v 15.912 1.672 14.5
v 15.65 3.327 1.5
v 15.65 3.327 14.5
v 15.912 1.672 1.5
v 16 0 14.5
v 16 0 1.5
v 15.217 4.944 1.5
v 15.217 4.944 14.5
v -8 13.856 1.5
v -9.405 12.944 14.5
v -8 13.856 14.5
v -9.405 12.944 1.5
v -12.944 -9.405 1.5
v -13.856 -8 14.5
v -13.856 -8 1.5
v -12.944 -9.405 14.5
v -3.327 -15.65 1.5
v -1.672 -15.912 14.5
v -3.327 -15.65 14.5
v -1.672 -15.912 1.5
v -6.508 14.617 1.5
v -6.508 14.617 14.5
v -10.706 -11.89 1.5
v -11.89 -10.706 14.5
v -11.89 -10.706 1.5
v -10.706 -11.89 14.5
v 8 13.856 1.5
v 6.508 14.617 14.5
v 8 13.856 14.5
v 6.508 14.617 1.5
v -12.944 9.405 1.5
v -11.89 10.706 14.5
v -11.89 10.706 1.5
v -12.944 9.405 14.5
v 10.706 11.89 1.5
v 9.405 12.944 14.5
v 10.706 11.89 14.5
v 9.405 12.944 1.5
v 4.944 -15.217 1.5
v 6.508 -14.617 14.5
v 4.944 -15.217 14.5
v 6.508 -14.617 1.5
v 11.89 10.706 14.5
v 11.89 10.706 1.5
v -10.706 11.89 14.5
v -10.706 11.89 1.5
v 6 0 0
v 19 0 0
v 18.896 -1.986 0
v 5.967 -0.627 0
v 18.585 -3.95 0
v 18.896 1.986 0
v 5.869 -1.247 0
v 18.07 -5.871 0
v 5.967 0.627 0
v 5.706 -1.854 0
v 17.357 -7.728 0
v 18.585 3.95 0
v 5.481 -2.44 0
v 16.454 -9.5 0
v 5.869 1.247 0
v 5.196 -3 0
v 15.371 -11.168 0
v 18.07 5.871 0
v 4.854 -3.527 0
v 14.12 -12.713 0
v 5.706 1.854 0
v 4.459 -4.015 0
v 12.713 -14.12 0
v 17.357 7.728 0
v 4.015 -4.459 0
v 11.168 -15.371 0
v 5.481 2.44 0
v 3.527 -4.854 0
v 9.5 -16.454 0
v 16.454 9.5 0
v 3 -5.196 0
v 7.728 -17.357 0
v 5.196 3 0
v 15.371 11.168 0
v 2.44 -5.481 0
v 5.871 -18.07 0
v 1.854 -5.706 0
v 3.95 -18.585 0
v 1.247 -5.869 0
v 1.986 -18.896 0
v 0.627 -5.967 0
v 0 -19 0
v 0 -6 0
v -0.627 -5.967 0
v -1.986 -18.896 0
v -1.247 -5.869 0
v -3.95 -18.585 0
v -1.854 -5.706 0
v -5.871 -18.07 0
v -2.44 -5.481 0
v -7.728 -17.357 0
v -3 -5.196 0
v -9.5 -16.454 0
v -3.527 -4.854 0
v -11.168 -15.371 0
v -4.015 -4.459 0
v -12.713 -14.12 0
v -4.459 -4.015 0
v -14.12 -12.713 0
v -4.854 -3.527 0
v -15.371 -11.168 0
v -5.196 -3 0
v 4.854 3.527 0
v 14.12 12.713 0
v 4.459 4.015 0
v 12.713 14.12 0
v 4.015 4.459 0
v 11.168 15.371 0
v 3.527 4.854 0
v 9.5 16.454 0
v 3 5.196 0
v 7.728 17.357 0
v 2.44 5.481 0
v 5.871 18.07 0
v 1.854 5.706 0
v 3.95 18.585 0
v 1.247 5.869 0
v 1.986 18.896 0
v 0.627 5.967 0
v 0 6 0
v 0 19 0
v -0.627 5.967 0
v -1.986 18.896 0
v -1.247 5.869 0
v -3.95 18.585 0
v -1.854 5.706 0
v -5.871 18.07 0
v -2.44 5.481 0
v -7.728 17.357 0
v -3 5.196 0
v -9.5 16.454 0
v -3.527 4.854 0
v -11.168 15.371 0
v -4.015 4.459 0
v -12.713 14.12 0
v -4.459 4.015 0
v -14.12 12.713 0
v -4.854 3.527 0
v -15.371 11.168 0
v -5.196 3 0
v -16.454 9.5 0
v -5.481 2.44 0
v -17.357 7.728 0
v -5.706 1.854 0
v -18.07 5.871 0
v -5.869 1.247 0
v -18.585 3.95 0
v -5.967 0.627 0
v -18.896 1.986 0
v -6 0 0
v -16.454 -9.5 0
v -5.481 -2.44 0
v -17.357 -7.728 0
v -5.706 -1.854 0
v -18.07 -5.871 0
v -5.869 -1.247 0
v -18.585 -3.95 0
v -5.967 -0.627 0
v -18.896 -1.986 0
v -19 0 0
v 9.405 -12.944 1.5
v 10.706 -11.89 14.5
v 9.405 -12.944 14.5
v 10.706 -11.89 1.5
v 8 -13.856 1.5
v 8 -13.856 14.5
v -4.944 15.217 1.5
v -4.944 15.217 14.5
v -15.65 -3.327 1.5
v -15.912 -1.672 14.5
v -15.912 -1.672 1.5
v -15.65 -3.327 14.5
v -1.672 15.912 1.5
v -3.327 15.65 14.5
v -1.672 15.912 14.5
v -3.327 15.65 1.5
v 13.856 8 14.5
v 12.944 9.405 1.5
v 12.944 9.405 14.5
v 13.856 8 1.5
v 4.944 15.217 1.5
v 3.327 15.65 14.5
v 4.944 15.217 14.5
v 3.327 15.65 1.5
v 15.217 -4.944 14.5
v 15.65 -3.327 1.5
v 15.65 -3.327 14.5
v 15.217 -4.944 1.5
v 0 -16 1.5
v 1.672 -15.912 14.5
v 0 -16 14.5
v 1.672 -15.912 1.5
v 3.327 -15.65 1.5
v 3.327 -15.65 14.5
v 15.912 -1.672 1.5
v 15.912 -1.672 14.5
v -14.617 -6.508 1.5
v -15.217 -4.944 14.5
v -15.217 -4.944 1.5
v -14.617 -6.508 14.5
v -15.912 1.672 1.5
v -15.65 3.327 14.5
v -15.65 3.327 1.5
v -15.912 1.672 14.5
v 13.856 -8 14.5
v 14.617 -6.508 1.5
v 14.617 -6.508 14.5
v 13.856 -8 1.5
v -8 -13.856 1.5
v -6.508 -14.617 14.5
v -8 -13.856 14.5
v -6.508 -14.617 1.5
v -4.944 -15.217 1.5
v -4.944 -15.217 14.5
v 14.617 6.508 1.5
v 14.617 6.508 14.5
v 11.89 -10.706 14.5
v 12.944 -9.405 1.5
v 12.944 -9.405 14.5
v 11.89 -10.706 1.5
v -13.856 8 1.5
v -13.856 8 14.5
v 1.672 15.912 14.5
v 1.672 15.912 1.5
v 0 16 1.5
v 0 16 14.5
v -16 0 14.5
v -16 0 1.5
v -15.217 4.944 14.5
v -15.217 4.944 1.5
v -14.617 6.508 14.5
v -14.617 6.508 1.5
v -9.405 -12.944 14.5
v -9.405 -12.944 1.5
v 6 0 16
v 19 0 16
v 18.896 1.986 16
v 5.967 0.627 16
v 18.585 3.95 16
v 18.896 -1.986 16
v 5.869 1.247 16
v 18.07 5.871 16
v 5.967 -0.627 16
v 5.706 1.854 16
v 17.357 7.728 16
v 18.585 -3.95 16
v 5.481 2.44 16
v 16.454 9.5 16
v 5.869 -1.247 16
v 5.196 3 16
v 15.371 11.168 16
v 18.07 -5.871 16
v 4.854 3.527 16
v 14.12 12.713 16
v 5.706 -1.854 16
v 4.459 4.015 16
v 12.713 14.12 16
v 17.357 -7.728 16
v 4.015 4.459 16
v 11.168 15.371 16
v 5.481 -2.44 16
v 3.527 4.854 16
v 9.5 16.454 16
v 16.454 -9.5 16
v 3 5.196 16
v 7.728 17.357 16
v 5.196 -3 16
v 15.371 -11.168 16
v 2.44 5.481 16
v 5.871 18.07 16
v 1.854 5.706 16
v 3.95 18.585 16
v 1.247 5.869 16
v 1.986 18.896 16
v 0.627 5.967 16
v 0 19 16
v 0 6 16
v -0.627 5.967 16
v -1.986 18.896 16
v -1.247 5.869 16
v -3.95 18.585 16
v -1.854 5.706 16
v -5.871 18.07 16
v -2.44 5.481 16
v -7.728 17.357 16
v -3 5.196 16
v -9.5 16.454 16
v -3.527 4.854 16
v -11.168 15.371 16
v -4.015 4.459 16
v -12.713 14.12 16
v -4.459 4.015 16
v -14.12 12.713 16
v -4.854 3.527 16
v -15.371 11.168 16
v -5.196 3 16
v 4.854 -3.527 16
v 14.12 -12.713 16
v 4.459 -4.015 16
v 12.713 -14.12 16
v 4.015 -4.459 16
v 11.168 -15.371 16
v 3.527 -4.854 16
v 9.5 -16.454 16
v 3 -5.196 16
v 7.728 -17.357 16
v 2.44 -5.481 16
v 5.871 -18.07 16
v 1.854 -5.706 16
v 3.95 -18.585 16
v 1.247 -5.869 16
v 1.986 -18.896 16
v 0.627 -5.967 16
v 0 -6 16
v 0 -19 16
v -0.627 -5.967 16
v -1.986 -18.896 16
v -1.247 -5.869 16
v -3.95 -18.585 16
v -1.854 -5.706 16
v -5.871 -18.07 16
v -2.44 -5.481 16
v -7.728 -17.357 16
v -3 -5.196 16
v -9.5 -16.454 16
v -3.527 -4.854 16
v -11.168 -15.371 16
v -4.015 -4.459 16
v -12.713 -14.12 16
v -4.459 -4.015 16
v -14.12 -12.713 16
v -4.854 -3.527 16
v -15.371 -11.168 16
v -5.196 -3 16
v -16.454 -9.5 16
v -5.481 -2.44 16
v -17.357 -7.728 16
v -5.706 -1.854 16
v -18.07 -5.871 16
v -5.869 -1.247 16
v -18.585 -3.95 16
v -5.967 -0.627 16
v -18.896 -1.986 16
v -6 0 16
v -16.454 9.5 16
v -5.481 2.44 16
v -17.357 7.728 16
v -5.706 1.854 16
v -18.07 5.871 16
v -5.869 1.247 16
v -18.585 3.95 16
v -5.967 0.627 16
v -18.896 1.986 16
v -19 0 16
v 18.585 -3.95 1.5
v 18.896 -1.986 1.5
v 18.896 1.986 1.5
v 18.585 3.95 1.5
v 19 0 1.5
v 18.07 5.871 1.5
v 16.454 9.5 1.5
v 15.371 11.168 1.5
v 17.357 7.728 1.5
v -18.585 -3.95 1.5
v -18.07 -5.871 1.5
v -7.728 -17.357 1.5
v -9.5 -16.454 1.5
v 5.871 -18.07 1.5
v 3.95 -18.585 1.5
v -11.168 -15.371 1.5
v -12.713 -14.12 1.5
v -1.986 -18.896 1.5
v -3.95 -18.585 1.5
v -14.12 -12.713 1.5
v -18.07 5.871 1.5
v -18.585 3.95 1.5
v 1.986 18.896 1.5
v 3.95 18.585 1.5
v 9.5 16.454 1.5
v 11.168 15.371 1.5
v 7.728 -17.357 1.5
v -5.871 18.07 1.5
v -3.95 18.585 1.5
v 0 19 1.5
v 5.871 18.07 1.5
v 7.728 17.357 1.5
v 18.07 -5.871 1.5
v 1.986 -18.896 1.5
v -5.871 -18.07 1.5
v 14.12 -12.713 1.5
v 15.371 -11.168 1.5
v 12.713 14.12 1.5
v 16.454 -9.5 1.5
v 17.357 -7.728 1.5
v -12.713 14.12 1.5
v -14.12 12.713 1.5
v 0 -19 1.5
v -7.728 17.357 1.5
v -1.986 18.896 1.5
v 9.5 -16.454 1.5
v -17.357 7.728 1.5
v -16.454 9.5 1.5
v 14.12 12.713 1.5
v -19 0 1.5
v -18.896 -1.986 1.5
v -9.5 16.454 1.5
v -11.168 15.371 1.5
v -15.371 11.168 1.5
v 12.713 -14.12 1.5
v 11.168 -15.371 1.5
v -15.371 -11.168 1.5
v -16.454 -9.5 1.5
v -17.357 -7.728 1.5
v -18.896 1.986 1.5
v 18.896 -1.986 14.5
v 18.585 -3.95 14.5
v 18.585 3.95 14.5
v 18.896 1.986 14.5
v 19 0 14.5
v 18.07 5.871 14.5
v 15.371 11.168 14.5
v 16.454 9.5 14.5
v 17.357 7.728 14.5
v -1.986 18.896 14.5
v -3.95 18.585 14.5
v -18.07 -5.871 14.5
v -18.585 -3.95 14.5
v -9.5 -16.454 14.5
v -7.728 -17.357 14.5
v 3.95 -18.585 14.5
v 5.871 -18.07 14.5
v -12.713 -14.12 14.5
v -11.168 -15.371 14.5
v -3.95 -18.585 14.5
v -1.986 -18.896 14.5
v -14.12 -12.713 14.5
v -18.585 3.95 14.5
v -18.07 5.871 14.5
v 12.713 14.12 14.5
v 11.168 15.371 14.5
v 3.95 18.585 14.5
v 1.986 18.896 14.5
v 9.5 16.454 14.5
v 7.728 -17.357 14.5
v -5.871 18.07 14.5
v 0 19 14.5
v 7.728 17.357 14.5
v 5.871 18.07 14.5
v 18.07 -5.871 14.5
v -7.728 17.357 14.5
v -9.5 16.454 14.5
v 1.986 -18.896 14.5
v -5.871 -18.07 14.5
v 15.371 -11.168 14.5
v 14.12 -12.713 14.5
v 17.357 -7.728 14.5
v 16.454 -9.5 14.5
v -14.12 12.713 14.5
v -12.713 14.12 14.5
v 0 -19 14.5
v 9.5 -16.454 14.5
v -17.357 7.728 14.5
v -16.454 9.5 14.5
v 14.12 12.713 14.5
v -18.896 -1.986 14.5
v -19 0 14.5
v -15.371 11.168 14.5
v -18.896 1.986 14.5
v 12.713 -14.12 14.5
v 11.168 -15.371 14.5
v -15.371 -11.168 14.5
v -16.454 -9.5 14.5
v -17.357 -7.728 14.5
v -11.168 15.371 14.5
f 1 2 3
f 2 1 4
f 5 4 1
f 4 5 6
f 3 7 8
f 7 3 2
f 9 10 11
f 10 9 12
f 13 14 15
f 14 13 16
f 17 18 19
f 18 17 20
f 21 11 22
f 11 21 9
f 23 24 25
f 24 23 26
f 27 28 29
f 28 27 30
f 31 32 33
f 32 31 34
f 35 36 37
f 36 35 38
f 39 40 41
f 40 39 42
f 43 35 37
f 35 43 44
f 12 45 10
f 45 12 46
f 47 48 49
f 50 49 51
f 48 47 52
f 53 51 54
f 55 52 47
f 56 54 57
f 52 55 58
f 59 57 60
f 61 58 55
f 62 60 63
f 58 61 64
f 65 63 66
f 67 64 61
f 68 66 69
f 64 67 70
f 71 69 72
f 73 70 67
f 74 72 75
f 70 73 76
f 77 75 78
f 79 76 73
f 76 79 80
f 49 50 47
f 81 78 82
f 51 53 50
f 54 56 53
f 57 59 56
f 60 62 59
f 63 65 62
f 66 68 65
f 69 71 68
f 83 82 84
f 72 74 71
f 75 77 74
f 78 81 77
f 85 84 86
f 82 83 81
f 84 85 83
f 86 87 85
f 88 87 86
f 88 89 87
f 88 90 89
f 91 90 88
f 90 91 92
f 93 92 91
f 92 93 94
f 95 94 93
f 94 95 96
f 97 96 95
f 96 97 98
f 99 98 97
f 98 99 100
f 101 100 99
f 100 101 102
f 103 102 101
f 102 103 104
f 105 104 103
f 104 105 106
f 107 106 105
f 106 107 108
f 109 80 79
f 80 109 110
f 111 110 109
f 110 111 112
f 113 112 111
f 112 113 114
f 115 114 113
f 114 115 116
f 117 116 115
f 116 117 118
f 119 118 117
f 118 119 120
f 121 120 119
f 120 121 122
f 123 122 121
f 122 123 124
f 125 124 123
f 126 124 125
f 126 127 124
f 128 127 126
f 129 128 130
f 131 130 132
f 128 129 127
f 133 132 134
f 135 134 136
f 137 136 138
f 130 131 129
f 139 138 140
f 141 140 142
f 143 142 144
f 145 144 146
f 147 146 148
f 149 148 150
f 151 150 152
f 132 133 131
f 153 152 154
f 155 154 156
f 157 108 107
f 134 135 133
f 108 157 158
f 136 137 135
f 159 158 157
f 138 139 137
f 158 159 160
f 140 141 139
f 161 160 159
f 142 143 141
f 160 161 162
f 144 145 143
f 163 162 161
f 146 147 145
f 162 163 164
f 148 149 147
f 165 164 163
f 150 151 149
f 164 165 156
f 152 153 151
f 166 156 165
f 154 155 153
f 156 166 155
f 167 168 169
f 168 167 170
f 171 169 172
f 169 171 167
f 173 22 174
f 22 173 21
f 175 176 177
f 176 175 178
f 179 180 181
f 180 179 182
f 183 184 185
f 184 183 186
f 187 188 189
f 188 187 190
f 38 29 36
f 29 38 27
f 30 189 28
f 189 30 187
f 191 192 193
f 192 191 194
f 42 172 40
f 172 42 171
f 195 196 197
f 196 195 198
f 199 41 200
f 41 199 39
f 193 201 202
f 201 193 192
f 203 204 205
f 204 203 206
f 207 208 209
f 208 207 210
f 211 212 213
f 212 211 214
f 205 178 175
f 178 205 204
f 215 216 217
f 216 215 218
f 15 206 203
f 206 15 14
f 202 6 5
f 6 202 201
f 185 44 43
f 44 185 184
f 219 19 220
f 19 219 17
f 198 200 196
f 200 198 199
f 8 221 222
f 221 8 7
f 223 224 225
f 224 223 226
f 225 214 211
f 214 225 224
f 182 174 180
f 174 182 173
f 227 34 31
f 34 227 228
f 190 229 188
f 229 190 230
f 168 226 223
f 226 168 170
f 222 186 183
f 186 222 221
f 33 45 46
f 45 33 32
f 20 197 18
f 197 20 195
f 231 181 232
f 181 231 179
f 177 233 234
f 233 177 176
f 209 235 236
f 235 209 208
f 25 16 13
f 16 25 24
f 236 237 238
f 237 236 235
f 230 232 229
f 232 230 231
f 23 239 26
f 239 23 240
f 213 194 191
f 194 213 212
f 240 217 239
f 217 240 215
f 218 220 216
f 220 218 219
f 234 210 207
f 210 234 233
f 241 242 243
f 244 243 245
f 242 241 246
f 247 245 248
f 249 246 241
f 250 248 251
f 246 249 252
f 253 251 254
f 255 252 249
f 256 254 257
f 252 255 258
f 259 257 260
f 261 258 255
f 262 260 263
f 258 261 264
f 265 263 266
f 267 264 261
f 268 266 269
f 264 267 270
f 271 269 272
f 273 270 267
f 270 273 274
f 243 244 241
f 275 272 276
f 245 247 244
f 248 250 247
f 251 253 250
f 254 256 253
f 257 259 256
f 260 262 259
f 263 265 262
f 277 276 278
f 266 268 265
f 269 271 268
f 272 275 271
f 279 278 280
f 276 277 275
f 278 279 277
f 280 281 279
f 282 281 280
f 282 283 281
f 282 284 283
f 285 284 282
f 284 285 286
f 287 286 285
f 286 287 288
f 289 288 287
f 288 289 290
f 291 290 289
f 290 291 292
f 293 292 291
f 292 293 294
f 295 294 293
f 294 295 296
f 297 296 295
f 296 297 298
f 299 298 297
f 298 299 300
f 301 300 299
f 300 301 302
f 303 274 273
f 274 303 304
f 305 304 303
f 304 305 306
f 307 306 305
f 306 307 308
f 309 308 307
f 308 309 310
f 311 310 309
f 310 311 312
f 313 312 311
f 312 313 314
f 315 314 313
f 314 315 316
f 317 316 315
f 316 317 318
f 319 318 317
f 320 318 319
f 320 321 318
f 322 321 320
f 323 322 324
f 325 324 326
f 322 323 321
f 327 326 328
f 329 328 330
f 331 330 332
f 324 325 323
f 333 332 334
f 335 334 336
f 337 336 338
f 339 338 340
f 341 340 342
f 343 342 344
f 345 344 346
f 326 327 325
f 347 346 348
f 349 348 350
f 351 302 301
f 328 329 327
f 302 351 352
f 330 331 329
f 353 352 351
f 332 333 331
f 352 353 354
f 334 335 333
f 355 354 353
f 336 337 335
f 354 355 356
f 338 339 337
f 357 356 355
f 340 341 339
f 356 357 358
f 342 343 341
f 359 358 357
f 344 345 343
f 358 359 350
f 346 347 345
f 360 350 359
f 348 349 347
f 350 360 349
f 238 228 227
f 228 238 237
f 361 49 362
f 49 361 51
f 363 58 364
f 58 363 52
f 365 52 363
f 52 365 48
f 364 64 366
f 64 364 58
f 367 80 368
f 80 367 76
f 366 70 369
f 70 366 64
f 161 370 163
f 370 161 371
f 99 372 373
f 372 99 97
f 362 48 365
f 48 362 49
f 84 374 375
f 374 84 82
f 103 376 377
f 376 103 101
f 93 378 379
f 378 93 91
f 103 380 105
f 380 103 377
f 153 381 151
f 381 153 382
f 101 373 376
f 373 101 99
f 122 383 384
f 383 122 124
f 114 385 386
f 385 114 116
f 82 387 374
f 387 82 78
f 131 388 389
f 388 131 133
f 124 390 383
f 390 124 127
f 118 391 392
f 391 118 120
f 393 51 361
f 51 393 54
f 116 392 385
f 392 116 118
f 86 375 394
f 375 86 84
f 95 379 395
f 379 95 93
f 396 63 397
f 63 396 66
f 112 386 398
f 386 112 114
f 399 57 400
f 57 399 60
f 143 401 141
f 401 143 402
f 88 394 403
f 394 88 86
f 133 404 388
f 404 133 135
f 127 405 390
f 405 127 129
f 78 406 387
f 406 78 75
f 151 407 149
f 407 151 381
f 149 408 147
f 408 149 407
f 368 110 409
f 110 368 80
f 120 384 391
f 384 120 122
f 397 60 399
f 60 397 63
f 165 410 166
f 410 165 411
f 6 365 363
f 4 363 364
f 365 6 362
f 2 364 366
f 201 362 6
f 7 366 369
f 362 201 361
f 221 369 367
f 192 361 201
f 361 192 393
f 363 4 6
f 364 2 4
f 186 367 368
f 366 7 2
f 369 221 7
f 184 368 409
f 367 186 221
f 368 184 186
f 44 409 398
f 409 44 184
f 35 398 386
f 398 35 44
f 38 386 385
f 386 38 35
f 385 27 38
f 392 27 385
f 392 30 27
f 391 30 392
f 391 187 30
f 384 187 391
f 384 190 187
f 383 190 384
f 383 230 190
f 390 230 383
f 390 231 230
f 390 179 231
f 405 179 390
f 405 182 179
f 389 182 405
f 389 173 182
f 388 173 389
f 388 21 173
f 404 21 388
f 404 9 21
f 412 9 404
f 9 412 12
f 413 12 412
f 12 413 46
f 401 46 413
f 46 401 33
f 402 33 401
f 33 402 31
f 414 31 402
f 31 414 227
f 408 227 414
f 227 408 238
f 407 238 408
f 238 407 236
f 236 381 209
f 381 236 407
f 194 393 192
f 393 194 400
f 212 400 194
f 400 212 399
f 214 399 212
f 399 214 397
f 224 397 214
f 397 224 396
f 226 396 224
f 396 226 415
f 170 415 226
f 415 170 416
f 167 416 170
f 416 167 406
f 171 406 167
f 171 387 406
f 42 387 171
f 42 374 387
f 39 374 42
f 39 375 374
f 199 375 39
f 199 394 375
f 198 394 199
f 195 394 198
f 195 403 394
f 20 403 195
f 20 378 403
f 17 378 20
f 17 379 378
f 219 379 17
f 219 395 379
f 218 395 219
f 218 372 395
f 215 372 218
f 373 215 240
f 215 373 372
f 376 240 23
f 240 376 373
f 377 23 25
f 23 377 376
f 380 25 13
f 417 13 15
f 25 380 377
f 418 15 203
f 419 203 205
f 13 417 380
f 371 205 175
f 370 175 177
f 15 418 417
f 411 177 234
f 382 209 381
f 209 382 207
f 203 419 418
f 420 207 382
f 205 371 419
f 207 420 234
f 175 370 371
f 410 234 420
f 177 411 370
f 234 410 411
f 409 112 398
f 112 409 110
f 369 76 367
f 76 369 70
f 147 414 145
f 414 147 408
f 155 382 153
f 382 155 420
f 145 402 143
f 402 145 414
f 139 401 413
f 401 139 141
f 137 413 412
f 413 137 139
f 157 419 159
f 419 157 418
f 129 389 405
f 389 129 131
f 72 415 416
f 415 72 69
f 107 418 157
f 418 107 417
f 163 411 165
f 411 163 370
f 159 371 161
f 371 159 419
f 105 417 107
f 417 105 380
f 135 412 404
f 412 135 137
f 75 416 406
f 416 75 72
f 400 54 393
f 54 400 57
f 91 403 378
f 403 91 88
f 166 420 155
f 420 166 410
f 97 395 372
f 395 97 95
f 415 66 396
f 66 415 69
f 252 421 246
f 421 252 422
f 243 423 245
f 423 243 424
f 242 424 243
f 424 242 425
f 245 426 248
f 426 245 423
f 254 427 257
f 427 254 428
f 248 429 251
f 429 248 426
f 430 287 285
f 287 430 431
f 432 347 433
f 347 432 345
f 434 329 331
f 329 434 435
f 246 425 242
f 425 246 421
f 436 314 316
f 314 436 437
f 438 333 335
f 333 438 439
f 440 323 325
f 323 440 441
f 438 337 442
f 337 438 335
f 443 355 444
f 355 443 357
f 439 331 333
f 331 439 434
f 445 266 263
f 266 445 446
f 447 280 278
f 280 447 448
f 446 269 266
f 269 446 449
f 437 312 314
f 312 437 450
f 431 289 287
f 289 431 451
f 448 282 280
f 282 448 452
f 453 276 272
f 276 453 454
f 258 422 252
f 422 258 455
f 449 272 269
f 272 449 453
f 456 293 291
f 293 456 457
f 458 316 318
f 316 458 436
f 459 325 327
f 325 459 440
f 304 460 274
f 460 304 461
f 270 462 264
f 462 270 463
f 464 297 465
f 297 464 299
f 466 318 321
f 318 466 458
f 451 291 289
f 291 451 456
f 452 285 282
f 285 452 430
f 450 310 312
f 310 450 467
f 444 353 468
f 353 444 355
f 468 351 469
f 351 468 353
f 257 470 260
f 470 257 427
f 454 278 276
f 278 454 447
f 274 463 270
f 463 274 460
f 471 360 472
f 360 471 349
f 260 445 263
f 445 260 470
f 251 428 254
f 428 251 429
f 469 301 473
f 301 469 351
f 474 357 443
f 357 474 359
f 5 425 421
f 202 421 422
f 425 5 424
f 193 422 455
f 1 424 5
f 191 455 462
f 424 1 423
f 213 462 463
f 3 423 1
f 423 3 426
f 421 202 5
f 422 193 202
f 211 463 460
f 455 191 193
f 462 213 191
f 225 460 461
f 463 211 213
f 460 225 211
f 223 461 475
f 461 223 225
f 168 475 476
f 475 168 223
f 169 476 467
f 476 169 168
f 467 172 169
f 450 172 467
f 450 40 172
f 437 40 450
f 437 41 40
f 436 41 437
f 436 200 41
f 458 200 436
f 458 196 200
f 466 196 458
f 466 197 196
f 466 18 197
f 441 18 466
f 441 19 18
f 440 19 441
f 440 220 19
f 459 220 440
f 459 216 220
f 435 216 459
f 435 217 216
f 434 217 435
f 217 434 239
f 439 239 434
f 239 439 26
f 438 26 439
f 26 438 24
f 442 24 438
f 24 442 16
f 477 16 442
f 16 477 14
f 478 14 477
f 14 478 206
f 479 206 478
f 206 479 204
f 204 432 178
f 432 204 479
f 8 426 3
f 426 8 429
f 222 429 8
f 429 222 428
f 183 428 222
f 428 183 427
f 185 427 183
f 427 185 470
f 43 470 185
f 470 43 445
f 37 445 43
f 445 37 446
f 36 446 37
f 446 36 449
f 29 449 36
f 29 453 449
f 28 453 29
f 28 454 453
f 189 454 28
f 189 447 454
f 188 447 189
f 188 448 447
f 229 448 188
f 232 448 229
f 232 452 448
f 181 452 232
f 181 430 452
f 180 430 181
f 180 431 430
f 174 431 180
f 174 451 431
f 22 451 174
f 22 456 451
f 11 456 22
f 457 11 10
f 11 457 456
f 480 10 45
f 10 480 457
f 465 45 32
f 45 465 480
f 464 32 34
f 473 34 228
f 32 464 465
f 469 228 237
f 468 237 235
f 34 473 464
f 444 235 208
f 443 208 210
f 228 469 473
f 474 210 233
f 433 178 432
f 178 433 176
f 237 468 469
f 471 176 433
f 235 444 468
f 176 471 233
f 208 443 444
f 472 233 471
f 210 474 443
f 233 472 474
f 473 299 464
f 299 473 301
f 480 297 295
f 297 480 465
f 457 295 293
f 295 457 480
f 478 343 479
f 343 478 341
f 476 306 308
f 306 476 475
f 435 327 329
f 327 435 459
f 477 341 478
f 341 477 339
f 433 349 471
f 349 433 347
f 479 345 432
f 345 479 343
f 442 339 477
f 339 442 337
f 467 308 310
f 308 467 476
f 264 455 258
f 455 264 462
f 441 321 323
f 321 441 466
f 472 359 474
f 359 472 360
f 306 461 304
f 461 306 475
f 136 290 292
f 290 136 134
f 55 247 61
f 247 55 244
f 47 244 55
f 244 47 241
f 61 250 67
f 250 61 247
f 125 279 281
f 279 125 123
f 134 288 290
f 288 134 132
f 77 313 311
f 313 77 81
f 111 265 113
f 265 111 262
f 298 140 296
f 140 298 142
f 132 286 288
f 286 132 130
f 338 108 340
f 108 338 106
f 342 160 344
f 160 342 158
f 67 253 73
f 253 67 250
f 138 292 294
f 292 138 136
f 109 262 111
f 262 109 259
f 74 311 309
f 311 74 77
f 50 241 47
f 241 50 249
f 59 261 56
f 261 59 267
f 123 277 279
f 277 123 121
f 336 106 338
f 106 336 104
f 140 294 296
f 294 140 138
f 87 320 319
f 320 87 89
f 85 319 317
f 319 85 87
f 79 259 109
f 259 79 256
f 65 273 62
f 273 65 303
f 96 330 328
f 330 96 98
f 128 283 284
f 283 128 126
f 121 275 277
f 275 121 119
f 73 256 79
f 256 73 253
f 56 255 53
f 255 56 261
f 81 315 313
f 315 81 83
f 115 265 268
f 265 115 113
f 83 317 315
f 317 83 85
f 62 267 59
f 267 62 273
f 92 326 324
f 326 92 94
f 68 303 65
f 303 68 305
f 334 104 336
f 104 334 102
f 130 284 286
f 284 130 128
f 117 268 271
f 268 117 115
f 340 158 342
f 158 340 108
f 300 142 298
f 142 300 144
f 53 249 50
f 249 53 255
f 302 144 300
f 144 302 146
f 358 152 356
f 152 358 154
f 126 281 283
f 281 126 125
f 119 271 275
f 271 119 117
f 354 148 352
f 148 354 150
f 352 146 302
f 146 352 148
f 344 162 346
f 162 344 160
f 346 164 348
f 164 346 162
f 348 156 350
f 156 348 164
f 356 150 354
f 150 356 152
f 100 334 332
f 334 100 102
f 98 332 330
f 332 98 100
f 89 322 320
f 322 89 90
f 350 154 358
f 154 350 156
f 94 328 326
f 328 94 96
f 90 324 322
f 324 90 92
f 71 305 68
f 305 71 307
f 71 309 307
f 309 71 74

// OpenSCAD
// Belt-guide pulley flange.
$fn = 60;
eps = 0.02;
bore_d = 12;
body_d = 32;
width = 16;
difference() { union() { cylinder(d=body_d,h=width); cylinder(d=body_d+6,h=1.5); translate([0,0,width-1.5]) cylinder(d=body_d+6,h=1.5); } translate([0,0,-eps]) cylinder(d=bore_d,h=width+2*eps); }
